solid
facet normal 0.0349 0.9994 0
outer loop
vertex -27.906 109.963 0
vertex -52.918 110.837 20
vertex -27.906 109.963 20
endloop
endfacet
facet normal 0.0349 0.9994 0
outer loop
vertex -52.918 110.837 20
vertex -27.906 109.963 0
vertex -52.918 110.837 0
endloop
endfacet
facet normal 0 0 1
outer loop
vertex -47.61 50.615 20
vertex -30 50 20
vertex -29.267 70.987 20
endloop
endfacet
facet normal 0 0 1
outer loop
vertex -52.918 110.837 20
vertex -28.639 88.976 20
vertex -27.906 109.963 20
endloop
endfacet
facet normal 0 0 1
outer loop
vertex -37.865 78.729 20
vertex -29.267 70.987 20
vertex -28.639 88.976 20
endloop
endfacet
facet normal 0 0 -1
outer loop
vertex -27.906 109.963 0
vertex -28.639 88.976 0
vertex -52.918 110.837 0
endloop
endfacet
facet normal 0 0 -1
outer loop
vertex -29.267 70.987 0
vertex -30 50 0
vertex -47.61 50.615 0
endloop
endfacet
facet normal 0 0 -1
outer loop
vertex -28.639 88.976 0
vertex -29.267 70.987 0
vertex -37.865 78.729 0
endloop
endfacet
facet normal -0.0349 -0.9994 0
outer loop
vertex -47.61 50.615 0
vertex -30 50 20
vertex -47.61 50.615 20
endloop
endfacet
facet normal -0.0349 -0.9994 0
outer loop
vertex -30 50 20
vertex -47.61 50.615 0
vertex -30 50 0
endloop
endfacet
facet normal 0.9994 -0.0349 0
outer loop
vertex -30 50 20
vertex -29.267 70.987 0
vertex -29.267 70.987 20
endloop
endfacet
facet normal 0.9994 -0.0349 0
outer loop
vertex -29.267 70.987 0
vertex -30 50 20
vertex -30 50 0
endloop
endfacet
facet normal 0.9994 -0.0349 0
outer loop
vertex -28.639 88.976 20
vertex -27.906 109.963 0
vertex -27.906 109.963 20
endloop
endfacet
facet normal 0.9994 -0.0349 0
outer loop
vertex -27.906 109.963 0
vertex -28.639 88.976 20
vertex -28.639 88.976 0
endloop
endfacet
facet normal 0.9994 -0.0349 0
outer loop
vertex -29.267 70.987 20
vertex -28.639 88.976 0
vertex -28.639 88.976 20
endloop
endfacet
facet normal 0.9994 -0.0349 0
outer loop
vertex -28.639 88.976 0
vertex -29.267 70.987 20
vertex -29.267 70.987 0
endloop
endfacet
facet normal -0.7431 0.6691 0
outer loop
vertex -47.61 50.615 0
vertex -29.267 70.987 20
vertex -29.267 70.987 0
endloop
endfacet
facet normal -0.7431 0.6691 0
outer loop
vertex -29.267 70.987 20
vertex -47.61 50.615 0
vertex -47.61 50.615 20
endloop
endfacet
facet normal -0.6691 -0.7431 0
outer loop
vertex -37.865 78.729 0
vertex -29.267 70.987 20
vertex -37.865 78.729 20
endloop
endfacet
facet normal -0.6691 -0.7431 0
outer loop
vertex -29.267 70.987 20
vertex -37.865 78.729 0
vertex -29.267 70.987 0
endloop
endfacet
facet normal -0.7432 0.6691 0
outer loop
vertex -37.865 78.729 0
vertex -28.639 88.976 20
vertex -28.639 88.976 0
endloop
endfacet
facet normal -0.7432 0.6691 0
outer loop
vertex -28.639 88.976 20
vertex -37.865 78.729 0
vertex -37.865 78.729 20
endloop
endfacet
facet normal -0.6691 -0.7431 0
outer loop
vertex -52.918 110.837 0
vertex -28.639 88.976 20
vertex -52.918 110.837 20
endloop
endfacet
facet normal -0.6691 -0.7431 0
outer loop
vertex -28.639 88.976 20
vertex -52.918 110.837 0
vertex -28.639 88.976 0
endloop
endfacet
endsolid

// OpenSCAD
translate([-30,50,0])
scale([3,3,1])
rotate([0,0,+88]) {
    difference() {
        cube([20, 20, 20]);
        translate([7, 0, -1]) {
            rotate([0,0,50]) {
                cube([30, 30, 30]);
            }
        }
        translate([13, 0, -1]) {
            rotate([0,0,50]) {
                cube([30, 30, 30]);
            }
        }
    }
}
